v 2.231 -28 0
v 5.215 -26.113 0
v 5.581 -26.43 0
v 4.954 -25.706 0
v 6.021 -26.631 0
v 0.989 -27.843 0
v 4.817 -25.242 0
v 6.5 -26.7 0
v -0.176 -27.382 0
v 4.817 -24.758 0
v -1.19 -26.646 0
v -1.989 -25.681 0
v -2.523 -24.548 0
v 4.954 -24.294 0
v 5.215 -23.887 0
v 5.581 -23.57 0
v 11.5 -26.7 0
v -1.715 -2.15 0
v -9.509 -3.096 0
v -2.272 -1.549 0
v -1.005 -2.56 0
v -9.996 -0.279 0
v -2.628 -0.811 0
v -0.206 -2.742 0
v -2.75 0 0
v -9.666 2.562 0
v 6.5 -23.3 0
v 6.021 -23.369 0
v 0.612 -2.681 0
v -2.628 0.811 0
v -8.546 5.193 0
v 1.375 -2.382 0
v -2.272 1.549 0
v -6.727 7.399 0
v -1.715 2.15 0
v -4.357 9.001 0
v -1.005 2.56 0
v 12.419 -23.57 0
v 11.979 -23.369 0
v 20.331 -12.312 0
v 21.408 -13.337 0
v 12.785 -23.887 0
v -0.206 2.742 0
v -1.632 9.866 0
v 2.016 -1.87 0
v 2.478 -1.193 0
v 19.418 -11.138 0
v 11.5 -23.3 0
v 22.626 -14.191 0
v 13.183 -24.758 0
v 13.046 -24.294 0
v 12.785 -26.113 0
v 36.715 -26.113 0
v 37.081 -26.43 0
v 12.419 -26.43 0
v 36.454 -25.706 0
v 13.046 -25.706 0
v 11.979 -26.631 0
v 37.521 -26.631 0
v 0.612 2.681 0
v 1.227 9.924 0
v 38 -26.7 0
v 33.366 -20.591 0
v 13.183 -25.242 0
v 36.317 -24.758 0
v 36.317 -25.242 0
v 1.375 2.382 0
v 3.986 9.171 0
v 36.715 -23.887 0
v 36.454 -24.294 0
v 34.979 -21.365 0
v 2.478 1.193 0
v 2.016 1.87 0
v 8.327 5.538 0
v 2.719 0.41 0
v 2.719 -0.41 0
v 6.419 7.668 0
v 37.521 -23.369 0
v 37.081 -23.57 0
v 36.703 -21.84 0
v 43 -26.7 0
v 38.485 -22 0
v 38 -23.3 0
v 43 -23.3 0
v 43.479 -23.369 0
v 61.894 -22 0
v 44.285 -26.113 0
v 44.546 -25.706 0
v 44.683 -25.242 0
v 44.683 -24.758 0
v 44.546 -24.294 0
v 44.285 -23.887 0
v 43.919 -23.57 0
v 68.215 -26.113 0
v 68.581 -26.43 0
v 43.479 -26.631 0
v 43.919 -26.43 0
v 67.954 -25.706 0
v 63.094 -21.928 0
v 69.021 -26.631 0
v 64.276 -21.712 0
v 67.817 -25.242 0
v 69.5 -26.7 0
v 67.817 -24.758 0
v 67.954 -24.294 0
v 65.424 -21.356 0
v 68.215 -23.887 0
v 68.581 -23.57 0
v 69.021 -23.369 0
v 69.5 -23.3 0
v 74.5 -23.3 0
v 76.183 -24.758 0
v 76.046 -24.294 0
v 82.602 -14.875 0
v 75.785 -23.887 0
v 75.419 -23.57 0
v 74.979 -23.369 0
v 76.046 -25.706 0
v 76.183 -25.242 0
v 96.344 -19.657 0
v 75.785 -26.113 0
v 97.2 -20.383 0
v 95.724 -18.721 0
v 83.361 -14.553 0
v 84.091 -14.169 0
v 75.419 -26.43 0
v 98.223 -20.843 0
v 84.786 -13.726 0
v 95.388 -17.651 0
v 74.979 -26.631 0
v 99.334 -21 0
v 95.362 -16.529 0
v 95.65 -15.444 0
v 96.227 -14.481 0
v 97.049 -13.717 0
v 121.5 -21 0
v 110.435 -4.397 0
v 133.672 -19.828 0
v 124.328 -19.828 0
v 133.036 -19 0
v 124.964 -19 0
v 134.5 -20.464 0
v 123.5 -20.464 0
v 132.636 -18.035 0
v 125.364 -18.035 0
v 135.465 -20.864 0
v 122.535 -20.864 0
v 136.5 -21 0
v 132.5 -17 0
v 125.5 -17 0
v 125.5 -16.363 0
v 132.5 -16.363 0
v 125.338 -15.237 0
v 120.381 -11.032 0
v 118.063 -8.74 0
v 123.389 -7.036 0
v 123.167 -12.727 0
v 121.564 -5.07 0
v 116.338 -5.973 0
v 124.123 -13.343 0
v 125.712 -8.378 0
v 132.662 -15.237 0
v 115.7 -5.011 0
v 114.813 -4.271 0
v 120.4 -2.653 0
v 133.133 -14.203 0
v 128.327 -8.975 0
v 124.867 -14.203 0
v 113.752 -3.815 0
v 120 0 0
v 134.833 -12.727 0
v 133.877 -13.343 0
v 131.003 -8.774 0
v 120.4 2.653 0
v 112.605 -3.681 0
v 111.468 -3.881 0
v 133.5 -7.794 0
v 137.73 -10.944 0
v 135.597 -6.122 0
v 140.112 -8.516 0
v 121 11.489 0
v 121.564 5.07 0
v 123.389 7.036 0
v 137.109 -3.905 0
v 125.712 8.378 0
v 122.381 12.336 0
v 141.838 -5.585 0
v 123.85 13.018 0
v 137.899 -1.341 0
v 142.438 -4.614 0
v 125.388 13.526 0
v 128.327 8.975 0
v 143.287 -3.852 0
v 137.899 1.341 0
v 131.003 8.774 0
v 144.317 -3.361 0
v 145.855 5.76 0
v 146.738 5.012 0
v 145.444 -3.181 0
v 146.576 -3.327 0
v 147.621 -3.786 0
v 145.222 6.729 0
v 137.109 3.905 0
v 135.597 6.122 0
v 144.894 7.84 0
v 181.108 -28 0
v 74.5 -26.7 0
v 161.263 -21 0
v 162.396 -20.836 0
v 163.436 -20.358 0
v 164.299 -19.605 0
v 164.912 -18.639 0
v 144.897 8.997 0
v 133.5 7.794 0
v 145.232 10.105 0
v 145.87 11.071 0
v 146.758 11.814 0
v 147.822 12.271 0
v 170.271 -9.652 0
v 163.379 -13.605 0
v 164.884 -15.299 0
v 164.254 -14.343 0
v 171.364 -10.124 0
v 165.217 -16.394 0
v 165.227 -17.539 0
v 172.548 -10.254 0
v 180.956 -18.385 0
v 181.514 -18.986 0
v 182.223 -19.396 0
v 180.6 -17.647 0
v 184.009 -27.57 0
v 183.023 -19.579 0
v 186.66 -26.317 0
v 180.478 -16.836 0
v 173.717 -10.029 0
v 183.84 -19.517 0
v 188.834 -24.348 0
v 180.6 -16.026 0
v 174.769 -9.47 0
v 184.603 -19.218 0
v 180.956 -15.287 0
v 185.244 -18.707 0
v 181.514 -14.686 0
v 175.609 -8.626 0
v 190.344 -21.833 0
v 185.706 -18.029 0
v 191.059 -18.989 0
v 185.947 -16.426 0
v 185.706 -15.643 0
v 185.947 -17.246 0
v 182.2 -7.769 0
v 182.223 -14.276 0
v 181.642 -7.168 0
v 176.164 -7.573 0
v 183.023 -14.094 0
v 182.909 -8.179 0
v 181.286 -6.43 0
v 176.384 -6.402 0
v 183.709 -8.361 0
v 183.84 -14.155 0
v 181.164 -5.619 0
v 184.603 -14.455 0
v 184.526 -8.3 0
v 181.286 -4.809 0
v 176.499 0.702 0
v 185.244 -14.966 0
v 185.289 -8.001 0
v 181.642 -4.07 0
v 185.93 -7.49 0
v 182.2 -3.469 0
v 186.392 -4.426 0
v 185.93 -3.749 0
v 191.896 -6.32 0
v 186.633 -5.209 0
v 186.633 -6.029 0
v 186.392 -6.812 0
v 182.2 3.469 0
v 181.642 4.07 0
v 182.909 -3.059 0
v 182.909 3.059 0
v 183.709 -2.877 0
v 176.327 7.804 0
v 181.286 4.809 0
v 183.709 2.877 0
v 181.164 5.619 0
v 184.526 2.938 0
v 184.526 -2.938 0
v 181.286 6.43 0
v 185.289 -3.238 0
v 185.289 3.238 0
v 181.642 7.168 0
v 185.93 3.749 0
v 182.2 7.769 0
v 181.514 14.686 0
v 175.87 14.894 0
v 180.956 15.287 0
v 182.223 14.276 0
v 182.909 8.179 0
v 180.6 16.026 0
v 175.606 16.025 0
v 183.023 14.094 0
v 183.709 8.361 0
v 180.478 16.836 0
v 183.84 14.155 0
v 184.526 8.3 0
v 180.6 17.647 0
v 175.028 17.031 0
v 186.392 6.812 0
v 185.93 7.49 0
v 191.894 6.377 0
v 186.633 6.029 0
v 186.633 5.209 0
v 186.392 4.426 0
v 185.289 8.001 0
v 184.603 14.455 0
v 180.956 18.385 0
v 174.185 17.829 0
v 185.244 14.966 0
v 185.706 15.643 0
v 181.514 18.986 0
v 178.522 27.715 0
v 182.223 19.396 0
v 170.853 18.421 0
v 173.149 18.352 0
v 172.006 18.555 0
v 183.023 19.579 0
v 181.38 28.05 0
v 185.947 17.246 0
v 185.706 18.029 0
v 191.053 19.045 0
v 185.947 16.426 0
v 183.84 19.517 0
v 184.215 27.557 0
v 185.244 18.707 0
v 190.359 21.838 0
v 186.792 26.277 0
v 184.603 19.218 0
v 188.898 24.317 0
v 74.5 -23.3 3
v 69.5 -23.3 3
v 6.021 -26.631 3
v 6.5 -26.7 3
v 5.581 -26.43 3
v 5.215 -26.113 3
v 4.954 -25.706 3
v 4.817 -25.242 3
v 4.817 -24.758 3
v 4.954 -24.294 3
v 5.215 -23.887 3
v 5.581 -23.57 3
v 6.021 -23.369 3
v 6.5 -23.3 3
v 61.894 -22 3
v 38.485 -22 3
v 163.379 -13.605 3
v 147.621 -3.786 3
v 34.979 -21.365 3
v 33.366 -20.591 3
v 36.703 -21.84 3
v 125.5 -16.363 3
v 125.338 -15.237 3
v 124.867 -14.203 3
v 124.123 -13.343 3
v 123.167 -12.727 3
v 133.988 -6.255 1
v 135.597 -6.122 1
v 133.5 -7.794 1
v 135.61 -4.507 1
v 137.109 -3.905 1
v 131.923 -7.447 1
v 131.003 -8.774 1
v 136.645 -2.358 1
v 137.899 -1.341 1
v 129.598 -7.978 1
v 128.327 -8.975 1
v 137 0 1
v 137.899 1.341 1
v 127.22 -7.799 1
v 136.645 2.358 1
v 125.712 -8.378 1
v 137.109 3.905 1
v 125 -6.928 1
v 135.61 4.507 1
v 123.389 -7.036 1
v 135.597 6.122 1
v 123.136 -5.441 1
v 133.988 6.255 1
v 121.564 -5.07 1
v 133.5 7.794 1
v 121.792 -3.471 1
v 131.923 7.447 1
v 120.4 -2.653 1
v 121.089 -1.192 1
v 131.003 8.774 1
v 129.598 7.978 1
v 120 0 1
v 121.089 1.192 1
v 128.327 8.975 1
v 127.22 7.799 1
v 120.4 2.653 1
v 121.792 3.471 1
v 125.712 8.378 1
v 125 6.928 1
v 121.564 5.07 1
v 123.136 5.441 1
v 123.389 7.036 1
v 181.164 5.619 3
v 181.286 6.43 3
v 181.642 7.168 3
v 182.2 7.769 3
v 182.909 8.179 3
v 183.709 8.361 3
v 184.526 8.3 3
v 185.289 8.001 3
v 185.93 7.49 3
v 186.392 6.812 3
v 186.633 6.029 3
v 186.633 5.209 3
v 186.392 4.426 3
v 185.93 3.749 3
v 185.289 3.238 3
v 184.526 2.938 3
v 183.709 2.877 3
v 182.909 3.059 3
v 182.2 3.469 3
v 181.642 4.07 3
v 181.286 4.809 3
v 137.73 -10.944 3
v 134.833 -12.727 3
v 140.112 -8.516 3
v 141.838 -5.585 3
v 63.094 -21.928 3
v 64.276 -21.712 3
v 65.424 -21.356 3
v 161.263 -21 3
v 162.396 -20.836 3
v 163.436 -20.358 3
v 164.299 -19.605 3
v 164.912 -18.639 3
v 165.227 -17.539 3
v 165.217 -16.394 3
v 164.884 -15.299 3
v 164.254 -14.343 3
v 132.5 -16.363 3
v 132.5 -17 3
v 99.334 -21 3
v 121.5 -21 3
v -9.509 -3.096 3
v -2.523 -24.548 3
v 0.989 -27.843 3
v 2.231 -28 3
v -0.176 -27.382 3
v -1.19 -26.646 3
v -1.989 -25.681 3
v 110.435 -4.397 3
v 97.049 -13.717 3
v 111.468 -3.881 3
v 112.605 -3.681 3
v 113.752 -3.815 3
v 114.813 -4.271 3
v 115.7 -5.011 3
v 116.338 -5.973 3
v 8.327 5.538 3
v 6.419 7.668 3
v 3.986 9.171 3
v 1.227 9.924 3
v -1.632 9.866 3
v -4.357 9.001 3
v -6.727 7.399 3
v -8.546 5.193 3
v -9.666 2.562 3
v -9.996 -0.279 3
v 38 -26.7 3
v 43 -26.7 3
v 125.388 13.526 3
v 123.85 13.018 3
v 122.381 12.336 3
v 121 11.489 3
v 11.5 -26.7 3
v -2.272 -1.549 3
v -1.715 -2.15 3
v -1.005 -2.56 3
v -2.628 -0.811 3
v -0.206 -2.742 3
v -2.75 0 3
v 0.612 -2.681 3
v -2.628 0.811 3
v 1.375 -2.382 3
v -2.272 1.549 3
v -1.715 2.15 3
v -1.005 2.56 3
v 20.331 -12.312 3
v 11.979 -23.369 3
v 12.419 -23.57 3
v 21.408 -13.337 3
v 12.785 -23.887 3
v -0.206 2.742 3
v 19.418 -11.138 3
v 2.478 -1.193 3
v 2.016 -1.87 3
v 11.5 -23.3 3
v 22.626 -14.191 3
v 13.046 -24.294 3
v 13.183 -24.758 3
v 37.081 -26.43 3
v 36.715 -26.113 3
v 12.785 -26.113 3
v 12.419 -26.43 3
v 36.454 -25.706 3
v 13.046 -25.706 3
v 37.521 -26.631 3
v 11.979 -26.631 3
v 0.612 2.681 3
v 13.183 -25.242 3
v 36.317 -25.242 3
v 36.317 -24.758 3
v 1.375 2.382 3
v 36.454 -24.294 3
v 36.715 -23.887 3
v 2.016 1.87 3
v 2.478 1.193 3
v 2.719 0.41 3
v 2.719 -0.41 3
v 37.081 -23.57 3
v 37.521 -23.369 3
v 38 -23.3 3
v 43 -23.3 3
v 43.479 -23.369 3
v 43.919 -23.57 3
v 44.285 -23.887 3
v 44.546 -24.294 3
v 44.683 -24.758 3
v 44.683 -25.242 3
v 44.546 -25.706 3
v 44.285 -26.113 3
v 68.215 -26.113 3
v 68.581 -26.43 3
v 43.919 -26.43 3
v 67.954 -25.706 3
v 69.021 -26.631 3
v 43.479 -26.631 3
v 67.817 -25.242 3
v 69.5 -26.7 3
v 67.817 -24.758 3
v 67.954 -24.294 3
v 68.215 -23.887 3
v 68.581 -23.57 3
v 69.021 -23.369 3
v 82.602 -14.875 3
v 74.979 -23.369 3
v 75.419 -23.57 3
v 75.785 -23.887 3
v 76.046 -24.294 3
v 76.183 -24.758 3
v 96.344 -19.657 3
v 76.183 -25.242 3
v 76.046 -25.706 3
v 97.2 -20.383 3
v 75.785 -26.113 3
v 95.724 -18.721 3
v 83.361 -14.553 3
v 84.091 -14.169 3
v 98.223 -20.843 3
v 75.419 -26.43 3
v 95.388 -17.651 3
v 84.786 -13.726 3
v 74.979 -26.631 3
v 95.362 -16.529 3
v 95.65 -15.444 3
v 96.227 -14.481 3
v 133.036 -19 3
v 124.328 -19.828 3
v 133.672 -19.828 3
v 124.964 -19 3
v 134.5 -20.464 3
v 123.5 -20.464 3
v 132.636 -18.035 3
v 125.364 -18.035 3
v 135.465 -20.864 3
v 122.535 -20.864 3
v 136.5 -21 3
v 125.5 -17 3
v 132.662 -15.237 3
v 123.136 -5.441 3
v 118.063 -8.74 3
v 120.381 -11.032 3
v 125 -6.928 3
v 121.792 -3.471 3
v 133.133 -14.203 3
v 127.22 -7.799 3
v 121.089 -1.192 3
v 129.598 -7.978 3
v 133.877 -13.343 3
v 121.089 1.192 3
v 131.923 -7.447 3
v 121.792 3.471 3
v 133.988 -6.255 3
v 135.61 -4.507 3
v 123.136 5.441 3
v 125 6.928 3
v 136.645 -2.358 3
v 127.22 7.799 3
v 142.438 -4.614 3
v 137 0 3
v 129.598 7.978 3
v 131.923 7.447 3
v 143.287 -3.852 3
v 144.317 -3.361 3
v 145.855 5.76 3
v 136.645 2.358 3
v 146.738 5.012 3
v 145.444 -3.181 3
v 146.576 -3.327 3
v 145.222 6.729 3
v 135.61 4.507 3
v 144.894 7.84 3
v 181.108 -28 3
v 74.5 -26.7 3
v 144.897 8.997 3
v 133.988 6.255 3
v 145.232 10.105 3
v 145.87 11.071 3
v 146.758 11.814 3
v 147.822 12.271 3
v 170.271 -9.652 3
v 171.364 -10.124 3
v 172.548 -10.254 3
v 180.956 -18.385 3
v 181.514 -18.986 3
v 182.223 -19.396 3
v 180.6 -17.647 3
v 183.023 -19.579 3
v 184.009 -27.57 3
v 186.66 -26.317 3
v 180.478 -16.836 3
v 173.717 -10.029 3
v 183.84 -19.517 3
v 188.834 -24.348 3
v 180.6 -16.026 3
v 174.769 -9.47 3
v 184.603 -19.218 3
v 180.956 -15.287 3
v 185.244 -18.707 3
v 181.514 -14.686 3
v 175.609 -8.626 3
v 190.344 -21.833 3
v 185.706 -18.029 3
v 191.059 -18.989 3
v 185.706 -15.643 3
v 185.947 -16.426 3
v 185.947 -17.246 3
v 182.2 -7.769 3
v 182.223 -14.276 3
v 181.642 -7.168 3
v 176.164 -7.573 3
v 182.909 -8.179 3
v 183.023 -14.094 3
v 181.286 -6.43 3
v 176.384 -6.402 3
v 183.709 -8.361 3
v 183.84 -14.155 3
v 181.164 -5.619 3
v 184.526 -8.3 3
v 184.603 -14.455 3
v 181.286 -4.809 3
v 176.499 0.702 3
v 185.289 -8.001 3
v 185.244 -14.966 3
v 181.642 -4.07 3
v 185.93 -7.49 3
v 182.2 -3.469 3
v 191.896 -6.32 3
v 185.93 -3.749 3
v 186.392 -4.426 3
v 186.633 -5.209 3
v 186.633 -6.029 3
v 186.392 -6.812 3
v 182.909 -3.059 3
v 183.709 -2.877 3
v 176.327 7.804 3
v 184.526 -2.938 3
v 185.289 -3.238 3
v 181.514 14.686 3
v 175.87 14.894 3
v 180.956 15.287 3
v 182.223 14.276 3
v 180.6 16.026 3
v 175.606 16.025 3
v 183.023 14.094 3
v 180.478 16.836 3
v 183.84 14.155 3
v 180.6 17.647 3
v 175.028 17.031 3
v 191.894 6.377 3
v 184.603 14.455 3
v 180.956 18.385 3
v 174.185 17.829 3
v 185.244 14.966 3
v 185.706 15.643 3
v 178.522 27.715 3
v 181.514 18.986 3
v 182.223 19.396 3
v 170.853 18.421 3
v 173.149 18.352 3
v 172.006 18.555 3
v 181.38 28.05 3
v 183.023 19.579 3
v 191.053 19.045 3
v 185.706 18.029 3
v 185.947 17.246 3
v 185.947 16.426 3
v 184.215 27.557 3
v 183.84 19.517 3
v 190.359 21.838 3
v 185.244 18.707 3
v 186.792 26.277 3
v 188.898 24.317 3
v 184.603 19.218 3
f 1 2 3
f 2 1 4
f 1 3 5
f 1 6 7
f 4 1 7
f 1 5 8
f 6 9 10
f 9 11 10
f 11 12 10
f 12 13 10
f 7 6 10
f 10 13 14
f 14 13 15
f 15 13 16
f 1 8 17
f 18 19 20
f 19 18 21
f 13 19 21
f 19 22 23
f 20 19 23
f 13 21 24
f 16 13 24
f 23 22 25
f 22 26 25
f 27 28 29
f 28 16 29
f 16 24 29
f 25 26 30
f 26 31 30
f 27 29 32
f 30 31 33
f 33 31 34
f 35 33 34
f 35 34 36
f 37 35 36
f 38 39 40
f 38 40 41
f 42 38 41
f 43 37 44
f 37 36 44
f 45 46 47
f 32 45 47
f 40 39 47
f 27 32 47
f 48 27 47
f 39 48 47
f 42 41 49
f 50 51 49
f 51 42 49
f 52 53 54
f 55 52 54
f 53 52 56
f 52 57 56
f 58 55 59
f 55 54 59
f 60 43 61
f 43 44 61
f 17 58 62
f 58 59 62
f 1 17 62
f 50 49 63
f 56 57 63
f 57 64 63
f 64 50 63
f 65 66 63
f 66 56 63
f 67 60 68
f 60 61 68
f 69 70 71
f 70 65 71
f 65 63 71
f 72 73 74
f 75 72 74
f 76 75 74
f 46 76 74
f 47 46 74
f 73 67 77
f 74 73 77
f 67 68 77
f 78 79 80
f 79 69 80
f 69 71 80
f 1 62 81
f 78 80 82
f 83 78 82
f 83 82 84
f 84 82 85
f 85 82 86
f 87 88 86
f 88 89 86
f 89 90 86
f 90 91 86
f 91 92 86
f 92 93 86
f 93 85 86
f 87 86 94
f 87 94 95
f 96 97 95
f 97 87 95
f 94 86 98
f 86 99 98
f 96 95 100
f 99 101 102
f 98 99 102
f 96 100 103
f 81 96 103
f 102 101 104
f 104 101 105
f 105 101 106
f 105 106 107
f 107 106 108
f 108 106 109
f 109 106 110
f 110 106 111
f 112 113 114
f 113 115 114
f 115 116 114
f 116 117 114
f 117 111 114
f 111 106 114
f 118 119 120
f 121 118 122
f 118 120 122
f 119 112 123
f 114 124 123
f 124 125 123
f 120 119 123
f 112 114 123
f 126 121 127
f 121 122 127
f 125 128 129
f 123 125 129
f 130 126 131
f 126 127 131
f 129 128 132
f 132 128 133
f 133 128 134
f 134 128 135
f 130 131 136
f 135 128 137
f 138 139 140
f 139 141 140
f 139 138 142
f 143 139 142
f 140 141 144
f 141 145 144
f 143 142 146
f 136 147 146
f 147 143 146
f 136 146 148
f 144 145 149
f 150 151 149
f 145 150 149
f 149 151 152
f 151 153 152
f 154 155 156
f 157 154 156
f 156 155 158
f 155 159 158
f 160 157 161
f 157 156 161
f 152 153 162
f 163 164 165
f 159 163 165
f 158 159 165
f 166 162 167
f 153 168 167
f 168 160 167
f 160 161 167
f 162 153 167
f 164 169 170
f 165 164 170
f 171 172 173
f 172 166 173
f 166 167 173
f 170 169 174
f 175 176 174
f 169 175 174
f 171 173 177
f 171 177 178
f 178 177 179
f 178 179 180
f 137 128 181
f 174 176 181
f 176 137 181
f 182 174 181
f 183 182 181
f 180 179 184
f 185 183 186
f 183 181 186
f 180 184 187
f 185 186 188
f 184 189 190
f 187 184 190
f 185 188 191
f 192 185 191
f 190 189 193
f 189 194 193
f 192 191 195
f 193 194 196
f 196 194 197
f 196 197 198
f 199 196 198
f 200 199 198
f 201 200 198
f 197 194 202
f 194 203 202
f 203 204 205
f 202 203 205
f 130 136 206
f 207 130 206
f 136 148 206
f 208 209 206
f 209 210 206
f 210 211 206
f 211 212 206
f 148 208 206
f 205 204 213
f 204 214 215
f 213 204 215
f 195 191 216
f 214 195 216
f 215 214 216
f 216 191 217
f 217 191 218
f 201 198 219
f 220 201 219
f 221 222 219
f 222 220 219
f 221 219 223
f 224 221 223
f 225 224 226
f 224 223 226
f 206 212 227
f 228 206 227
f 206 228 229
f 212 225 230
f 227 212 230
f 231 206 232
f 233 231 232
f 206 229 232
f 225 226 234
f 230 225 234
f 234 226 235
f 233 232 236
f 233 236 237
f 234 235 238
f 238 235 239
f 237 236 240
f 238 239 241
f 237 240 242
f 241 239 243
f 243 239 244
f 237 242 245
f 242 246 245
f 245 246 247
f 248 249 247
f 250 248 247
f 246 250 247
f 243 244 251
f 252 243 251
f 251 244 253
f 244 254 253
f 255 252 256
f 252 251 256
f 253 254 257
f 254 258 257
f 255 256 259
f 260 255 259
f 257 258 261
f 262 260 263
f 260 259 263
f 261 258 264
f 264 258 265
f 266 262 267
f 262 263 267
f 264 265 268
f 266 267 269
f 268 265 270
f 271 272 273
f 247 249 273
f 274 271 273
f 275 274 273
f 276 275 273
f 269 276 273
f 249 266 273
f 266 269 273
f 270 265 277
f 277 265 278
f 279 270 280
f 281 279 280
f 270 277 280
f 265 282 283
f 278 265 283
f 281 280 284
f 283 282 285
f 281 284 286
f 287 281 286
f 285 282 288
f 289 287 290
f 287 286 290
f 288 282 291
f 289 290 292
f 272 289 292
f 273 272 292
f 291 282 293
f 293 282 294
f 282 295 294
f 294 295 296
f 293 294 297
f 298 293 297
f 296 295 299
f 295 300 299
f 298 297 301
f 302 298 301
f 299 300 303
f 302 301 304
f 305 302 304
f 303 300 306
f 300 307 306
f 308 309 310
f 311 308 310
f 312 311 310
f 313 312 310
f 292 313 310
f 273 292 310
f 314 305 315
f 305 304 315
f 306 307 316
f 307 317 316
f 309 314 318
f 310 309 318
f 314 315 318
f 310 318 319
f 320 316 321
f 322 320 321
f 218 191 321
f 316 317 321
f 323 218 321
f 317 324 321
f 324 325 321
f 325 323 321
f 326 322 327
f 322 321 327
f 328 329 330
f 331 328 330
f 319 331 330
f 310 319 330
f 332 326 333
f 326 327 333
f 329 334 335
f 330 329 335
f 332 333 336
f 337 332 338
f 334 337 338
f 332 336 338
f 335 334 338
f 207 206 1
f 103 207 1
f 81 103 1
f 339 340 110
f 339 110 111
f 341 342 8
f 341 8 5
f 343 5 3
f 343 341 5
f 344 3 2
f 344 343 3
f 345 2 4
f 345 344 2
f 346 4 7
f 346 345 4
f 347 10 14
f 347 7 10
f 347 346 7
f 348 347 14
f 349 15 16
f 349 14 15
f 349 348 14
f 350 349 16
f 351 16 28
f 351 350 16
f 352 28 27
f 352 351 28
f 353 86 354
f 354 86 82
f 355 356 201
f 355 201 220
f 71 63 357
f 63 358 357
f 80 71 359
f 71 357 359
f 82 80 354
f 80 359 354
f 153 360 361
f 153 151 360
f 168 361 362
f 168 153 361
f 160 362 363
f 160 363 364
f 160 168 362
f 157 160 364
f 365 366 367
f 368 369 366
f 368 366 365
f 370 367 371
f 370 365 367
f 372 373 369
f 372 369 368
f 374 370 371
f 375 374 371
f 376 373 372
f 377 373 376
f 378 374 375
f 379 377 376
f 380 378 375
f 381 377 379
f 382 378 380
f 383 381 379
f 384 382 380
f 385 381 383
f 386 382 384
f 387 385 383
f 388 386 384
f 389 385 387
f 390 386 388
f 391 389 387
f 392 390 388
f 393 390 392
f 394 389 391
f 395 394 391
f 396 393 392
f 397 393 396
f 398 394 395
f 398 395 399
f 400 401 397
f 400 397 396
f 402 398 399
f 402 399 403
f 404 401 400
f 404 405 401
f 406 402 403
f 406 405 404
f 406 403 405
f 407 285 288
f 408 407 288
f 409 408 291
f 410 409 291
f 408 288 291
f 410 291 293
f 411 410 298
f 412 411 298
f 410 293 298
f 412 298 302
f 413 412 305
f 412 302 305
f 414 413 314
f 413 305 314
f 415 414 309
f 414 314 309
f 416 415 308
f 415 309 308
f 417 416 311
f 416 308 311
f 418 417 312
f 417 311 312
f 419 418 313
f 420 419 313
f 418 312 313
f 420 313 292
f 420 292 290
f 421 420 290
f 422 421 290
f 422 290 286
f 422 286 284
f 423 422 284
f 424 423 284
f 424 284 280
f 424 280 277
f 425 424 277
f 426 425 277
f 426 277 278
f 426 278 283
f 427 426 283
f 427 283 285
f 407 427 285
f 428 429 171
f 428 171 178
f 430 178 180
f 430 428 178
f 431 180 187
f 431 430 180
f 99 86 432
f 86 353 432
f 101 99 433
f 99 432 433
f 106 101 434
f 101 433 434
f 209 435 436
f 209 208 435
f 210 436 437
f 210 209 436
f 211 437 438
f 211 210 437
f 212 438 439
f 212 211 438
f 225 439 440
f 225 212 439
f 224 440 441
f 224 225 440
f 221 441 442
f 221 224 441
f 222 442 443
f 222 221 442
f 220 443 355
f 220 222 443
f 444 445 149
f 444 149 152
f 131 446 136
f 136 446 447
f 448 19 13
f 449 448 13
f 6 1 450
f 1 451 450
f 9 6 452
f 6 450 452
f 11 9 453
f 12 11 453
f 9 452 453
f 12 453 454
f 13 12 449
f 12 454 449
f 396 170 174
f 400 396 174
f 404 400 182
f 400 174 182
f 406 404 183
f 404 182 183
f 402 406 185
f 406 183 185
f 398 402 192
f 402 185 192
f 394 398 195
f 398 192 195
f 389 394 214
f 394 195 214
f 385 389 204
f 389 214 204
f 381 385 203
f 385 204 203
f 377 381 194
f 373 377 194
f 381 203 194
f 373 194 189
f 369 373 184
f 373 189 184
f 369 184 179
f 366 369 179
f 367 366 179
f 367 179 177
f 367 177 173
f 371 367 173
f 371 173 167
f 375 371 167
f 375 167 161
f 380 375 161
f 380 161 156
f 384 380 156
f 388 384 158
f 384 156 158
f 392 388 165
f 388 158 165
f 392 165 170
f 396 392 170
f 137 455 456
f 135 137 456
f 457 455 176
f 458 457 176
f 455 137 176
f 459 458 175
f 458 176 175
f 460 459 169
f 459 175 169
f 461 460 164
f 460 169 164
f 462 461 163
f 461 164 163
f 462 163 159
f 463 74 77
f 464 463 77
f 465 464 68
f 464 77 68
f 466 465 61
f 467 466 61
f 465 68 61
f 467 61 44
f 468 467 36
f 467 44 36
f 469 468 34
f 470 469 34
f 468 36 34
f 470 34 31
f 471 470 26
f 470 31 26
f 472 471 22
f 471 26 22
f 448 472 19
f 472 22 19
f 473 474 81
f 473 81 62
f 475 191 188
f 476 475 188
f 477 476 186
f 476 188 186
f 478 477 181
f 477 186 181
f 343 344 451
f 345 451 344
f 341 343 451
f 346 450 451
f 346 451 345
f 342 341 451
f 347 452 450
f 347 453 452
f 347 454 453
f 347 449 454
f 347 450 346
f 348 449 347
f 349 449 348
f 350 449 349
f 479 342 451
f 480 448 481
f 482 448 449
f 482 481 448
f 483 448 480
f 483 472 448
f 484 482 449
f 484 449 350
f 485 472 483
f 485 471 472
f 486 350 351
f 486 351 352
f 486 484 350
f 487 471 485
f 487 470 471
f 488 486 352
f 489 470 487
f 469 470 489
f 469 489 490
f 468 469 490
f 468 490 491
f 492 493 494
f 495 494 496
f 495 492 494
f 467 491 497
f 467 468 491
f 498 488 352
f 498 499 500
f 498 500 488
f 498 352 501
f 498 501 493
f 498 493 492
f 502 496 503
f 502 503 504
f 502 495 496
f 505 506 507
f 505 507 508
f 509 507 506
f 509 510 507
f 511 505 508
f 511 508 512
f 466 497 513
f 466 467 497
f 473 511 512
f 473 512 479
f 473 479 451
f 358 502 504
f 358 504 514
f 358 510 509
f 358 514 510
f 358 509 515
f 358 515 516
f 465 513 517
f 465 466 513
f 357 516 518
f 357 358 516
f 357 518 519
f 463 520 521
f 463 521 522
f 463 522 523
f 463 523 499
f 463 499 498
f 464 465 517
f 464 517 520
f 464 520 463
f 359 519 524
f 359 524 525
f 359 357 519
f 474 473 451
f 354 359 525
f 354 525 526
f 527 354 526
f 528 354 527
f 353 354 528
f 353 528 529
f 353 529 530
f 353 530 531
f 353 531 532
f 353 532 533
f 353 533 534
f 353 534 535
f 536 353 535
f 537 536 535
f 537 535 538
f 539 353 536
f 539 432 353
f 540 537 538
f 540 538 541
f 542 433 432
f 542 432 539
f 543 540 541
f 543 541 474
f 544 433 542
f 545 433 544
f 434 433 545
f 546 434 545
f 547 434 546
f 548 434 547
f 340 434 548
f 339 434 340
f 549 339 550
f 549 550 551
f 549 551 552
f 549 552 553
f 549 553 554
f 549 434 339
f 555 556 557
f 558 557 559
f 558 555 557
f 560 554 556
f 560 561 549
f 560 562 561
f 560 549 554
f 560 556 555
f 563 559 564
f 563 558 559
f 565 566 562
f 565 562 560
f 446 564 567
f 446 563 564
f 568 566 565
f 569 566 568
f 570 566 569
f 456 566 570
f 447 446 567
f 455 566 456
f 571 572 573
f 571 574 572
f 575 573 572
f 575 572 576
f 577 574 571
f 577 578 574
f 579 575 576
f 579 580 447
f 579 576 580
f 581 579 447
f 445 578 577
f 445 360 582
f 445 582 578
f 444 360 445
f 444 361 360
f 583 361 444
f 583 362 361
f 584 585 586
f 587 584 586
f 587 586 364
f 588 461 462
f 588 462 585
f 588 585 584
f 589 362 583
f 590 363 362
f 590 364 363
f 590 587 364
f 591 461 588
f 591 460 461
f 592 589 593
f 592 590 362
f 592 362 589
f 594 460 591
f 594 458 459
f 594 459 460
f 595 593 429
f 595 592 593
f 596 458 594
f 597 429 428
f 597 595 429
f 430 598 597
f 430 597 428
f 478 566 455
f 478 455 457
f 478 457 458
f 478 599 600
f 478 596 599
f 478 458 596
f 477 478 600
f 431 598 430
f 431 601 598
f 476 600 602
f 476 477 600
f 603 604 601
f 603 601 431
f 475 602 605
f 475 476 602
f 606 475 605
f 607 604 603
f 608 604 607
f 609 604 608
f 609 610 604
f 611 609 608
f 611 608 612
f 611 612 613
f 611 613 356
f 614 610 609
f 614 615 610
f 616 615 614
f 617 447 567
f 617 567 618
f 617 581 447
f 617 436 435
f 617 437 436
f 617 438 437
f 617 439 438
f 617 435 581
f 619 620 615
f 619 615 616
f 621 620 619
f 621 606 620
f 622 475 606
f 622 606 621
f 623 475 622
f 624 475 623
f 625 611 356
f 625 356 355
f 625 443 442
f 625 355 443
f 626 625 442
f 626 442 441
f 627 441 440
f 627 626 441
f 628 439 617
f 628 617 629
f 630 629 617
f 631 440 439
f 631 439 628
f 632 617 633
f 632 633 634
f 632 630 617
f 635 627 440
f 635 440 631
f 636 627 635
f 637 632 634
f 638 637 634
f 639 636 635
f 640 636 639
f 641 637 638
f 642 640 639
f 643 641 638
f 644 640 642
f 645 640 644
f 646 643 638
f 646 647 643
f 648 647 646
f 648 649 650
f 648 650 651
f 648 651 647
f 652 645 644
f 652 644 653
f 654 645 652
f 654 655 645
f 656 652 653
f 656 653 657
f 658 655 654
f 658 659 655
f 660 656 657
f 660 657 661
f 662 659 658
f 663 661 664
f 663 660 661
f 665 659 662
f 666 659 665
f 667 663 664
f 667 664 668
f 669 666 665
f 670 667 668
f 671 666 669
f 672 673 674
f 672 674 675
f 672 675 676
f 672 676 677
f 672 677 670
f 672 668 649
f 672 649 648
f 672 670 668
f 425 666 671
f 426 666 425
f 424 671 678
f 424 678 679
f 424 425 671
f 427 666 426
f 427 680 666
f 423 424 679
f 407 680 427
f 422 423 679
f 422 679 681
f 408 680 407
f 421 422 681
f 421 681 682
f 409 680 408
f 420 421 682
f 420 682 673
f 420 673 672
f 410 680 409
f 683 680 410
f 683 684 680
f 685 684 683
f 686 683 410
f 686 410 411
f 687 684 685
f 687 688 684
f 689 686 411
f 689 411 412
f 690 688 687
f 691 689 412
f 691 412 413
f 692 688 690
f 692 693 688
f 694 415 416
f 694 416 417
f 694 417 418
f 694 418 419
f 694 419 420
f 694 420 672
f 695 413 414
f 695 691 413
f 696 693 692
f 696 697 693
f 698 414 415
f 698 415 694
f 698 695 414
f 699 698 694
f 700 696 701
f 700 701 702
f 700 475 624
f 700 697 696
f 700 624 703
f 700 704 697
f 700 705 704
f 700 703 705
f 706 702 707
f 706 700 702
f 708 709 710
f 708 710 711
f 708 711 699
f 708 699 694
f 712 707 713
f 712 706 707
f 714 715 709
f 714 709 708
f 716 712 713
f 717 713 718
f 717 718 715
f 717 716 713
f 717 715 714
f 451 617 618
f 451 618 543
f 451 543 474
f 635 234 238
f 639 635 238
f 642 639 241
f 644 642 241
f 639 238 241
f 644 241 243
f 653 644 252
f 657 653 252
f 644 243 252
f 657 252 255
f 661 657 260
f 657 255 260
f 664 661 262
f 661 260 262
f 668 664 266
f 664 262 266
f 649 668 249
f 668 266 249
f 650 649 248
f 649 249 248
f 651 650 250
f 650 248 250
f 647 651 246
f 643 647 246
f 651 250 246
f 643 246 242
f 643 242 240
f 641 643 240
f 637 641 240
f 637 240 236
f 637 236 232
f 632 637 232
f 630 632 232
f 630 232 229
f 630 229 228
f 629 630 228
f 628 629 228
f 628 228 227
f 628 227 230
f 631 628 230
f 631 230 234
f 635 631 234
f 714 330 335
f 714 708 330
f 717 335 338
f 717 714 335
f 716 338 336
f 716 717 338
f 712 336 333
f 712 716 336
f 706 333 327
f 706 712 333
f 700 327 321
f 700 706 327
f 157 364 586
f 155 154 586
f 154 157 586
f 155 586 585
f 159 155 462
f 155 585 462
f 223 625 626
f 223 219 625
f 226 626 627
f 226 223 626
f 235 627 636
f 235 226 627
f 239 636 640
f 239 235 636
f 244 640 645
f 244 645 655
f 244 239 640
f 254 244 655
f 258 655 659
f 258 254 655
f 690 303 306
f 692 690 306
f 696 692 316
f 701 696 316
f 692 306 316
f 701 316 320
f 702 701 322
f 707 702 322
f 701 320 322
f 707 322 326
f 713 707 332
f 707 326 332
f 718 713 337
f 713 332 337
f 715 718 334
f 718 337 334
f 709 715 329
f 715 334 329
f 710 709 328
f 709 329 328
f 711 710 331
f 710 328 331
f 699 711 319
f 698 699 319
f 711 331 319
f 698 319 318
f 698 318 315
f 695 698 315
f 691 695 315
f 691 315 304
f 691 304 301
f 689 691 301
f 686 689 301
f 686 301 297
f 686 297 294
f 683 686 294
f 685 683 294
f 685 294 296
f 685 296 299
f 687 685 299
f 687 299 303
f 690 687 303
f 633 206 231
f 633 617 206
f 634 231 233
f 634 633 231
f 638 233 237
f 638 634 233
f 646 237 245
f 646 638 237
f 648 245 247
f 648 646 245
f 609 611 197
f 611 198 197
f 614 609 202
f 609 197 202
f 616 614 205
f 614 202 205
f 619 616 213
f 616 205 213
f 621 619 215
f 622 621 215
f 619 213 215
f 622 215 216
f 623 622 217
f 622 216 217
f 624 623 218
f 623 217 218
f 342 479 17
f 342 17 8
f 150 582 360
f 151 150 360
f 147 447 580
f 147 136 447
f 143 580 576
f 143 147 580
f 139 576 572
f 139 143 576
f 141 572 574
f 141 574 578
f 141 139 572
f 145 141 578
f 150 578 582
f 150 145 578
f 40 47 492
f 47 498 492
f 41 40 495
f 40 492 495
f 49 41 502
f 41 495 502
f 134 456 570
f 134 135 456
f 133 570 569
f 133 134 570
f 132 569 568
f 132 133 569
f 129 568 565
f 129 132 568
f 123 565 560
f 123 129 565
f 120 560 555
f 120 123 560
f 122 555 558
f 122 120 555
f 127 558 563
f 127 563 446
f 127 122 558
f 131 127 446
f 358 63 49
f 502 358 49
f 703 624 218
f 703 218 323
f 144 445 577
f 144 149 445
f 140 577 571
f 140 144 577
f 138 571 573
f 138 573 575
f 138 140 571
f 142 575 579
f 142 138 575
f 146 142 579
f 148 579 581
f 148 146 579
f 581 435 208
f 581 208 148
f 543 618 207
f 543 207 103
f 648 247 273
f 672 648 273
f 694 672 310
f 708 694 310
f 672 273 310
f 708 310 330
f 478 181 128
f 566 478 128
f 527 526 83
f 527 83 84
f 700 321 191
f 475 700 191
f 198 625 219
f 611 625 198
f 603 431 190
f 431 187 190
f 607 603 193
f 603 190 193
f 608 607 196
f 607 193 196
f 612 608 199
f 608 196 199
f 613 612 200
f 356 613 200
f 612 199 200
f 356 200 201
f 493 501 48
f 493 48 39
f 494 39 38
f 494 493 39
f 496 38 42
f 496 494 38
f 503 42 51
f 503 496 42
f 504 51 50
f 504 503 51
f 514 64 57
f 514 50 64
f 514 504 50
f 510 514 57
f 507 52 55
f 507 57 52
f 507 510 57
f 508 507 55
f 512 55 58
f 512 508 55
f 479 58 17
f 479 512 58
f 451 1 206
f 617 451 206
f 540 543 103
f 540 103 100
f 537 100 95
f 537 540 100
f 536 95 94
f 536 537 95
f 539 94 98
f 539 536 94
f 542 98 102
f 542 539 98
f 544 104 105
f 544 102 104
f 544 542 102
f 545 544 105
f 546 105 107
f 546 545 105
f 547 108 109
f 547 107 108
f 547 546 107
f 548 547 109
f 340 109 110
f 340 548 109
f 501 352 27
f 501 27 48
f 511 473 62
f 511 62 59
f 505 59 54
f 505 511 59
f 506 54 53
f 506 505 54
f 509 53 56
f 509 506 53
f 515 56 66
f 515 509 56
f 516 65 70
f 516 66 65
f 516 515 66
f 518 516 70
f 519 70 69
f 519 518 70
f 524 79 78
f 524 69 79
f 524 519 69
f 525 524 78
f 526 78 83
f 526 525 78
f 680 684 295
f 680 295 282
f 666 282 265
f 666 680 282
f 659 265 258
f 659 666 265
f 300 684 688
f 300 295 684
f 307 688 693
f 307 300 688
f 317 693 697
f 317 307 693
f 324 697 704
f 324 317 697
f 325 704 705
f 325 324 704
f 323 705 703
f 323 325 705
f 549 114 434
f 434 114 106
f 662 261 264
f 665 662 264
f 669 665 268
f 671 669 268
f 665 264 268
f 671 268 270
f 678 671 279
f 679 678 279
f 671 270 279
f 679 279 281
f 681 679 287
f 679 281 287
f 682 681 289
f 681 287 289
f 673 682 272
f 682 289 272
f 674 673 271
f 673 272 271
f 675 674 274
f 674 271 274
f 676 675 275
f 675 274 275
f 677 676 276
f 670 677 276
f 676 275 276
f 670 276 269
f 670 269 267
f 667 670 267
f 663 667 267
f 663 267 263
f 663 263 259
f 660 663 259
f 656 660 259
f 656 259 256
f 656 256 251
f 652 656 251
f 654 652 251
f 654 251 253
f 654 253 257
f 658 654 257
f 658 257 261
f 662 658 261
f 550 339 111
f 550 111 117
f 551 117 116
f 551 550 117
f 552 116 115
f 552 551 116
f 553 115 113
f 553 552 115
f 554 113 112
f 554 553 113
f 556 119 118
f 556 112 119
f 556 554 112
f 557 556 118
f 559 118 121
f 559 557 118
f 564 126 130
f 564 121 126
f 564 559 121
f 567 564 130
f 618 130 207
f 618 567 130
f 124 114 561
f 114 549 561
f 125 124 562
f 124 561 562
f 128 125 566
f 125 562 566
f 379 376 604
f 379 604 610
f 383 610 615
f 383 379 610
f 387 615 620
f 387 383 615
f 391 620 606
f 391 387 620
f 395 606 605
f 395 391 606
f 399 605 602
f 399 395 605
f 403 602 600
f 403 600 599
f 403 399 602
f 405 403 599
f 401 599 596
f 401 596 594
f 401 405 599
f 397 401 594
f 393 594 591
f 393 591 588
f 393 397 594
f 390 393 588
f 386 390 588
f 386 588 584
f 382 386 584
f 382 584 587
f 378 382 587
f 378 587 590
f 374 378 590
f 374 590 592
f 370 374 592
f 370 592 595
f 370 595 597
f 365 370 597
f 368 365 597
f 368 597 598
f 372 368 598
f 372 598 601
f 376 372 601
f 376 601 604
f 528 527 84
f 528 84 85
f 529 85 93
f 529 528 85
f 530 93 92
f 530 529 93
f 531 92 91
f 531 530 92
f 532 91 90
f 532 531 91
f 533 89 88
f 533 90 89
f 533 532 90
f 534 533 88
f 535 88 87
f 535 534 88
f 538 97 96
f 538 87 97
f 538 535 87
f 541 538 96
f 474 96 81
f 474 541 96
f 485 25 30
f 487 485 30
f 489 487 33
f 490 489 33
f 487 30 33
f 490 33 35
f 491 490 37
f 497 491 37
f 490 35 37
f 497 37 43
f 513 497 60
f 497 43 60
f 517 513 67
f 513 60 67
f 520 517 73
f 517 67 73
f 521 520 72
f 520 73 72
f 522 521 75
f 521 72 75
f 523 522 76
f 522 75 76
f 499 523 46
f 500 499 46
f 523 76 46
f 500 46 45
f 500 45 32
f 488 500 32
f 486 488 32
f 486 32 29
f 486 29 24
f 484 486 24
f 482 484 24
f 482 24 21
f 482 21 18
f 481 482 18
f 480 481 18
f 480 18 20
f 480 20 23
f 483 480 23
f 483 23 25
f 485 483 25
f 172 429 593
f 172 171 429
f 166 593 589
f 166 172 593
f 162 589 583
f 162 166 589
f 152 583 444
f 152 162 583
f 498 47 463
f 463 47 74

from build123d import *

# Parameters (mm, degrees)
SKETCH_1_R          = 8
EXTRUDE_1_DEPTH     = 3
HOLE_WIZARD_M31_D   = 3.4
HOLE_WIZARD_M51_D   = 5.5
HOLE_WIZARD_M52_D   = 5.5
FILLET_1_R          = 10
FILLET_2_R          = 5
CUT_EXTRUDE_1_DEPTH = 195.061830596
FILLET_3_R          = 4
SKETCH_9_R          = 9
CUT_EXTRUDE_2_DEPTH = 1
CUT_EXTRUDE_3_DEPTH = 195.061830596


with BuildPart() as part:
    # Эскиз1 → Бобышка-Вытянуть1 (new body)
    with BuildSketch(Plane.XY):
        with BuildLine():
            Line((-9.508526364, -3.096437692), (-1.398717752, -28))
            Line((-1.398717752, -28), (189.947361129, -28))
            ThreePointArc((189.947361129, -28), (191.995297124, 1.34383112), (189.536809823, 30.656120467))
            Line((189.536809823, 30.656120467), (125.388049295, 13.526041997))
            ThreePointArc((125.388049295, 13.526041997), (123.105499175, 12.698616461), (121.000225207, 11.489282104))
            Line((121.000225207, 11.489282104), (83.76563687, -14.436473614))
            Line((83.76563687, -14.436473614), (63.718090084, -22))
            Line((63.718090084, -22), (35.731449132, -22))
            Line((35.731449132, -22), (20.675178874, -13.02912429))
            Line((20.675178874, -13.02912429), (8.326583423, 5.537870395))
            ThreePointArc((8.326583423, 5.537870395), (-4.357415095, 9.00071851), (-9.508526364, -3.096437692))
        make_face()
        with Locations((129, 0)):
            Circle(SKETCH_1_R, mode=Mode.SUBTRACT)
    extrude(amount=EXTRUDE_1_DEPTH)

    # Отверстие с зазором M31 (through all)
    with Locations(Plane.XY.offset(3)):
        with Locations((9, -25), (40.5, -25), (72, -25)):
            Hole(HOLE_WIZARD_M31_D / 2)

    # Отверстие с зазором M51 (through all)
    with Locations(Plane.XY.offset(3)):
        with Locations((0, 0)):
            Hole(HOLE_WIZARD_M51_D / 2)

    # Отверстие с зазором M52 (through all)
    with Locations(Plane.XY.offset(3)):
        with Locations((183.228106674, 16.836297834), (183.914180714, 5.619086431), (183.914180714, -5.619086431), (183.228106674, -16.836297834)):
            Hole(HOLE_WIZARD_M52_D / 2)

    # Скругление1
    fillet_1_edges = [part.edges().sort_by_distance(p)[0] for p in [
        (35.731449132, -22, 1.5),
        (63.718090084, -22, 1.5),
        (83.76563687, -14.436473614, 1.5),
        (189.536809823, 30.656120467, 1.5),
        (189.947361129, -28, 1.5),
        (20.675178874, -13.02912429, 1.5),
    ]]
    fillet(fillet_1_edges, radius=FILLET_1_R)

    # Скругление2
    fillet_2_edges = [part.edges().sort_by_distance(p)[0] for p in [
        (-1.398717752, -28, 1.5),
    ]]
    fillet(fillet_2_edges, radius=FILLET_2_R)

    # Эскиз8 → Вырез-Вытянуть1 (cut, through all)
    with BuildSketch(Plane.XY.offset(3)):
        with BuildLine():
            Line((138.90792063, 9.891062066), (175.404223108, 19.636917172))
            ThreePointArc((175.404223108, 19.636917172), (176.470620047, 3.220288824), (176.003884761, -13.22431658))
            Line((176.003884761, -13.22431658), (138.90792063, 9.891062066))
        make_face()
        with BuildLine():
            Line((142.971746687, -0.888985098), (175.246255309, -21))
            Line((175.246255309, -21), (132.5, -21))
            Line((132.5, -21), (132.5, -13.555441712))
            ThreePointArc((132.5, -13.555441712), (139.790053932, -8.92046726), (142.971746687, -0.888985098))
        make_face()
        with BuildLine():
            Line((115.05010243, -1.183367143), (86.589440581, -21))
            Line((86.589440581, -21), (125.5, -21))
            Line((125.5, -21), (125.5, -13.555441712))
            ThreePointArc((125.5, -13.555441712), (118.304590303, -9.033726331), (115.05010243, -1.183367143))
        make_face()
    extrude(amount=-CUT_EXTRUDE_1_DEPTH, mode=Mode.SUBTRACT)

    # Скругление3
    fillet_3_edges = [part.edges().sort_by_distance(p)[0] for p in [
        (175.404223108, 19.636917172, 1.5),
        (176.003884761, -13.22431658, 1.5),
        (138.90792063, 9.891062066, 1.5),
        (115.05010243, -1.183367143, 1.5),
        (125.5, -13.555441712, 1.5),
        (125.5, -21, 1.5),
        (86.589440581, -21, 1.5),
        (175.246255309, -21, 1.5),
        (132.5, -21, 1.5),
        (132.5, -13.555441712, 1.5),
        (142.971746687, -0.888985098, 1.5),
    ]]
    fillet(fillet_3_edges, radius=FILLET_3_R)

    # Эскиз9 → Вырез-Вытянуть2 (cut)
    with BuildSketch(Plane(origin=(0, 0, 0), x_dir=(-1, 0, 0), z_dir=(0, 0, -1))):
        with Locations((-129, 0)):
            Circle(SKETCH_9_R)
    extrude(amount=-CUT_EXTRUDE_2_DEPTH, mode=Mode.SUBTRACT)

    # Эскиз10 → Вырез-Вытянуть3 (cut, through all)
    with BuildSketch(Plane.XY.offset(3)):
        with BuildLine():
            Line((6.5, -23.3), (11.5, -23.3))
            ThreePointArc((11.5, -23.3), (13.2, -25), (11.5, -26.7))
            Line((11.5, -26.7), (6.5, -26.7))
            ThreePointArc((6.5, -26.7), (4.8, -25), (6.5, -23.3))
        make_face()
        with BuildLine():
            Line((38, -23.3), (43, -23.3))
            ThreePointArc((43, -23.3), (44.7, -25), (43, -26.7))
            Line((43, -26.7), (38, -26.7))
            ThreePointArc((38, -26.7), (36.3, -25), (38, -23.3))
        make_face()
        with BuildLine():
            Line((69.5, -23.3), (74.5, -23.3))
            ThreePointArc((74.5, -23.3), (76.2, -25), (74.5, -26.7))
            Line((74.5, -26.7), (69.5, -26.7))
            ThreePointArc((69.5, -26.7), (67.8, -25), (69.5, -23.3))
        make_face()
    extrude(amount=-CUT_EXTRUDE_3_DEPTH, mode=Mode.SUBTRACT)


solid = part.part
